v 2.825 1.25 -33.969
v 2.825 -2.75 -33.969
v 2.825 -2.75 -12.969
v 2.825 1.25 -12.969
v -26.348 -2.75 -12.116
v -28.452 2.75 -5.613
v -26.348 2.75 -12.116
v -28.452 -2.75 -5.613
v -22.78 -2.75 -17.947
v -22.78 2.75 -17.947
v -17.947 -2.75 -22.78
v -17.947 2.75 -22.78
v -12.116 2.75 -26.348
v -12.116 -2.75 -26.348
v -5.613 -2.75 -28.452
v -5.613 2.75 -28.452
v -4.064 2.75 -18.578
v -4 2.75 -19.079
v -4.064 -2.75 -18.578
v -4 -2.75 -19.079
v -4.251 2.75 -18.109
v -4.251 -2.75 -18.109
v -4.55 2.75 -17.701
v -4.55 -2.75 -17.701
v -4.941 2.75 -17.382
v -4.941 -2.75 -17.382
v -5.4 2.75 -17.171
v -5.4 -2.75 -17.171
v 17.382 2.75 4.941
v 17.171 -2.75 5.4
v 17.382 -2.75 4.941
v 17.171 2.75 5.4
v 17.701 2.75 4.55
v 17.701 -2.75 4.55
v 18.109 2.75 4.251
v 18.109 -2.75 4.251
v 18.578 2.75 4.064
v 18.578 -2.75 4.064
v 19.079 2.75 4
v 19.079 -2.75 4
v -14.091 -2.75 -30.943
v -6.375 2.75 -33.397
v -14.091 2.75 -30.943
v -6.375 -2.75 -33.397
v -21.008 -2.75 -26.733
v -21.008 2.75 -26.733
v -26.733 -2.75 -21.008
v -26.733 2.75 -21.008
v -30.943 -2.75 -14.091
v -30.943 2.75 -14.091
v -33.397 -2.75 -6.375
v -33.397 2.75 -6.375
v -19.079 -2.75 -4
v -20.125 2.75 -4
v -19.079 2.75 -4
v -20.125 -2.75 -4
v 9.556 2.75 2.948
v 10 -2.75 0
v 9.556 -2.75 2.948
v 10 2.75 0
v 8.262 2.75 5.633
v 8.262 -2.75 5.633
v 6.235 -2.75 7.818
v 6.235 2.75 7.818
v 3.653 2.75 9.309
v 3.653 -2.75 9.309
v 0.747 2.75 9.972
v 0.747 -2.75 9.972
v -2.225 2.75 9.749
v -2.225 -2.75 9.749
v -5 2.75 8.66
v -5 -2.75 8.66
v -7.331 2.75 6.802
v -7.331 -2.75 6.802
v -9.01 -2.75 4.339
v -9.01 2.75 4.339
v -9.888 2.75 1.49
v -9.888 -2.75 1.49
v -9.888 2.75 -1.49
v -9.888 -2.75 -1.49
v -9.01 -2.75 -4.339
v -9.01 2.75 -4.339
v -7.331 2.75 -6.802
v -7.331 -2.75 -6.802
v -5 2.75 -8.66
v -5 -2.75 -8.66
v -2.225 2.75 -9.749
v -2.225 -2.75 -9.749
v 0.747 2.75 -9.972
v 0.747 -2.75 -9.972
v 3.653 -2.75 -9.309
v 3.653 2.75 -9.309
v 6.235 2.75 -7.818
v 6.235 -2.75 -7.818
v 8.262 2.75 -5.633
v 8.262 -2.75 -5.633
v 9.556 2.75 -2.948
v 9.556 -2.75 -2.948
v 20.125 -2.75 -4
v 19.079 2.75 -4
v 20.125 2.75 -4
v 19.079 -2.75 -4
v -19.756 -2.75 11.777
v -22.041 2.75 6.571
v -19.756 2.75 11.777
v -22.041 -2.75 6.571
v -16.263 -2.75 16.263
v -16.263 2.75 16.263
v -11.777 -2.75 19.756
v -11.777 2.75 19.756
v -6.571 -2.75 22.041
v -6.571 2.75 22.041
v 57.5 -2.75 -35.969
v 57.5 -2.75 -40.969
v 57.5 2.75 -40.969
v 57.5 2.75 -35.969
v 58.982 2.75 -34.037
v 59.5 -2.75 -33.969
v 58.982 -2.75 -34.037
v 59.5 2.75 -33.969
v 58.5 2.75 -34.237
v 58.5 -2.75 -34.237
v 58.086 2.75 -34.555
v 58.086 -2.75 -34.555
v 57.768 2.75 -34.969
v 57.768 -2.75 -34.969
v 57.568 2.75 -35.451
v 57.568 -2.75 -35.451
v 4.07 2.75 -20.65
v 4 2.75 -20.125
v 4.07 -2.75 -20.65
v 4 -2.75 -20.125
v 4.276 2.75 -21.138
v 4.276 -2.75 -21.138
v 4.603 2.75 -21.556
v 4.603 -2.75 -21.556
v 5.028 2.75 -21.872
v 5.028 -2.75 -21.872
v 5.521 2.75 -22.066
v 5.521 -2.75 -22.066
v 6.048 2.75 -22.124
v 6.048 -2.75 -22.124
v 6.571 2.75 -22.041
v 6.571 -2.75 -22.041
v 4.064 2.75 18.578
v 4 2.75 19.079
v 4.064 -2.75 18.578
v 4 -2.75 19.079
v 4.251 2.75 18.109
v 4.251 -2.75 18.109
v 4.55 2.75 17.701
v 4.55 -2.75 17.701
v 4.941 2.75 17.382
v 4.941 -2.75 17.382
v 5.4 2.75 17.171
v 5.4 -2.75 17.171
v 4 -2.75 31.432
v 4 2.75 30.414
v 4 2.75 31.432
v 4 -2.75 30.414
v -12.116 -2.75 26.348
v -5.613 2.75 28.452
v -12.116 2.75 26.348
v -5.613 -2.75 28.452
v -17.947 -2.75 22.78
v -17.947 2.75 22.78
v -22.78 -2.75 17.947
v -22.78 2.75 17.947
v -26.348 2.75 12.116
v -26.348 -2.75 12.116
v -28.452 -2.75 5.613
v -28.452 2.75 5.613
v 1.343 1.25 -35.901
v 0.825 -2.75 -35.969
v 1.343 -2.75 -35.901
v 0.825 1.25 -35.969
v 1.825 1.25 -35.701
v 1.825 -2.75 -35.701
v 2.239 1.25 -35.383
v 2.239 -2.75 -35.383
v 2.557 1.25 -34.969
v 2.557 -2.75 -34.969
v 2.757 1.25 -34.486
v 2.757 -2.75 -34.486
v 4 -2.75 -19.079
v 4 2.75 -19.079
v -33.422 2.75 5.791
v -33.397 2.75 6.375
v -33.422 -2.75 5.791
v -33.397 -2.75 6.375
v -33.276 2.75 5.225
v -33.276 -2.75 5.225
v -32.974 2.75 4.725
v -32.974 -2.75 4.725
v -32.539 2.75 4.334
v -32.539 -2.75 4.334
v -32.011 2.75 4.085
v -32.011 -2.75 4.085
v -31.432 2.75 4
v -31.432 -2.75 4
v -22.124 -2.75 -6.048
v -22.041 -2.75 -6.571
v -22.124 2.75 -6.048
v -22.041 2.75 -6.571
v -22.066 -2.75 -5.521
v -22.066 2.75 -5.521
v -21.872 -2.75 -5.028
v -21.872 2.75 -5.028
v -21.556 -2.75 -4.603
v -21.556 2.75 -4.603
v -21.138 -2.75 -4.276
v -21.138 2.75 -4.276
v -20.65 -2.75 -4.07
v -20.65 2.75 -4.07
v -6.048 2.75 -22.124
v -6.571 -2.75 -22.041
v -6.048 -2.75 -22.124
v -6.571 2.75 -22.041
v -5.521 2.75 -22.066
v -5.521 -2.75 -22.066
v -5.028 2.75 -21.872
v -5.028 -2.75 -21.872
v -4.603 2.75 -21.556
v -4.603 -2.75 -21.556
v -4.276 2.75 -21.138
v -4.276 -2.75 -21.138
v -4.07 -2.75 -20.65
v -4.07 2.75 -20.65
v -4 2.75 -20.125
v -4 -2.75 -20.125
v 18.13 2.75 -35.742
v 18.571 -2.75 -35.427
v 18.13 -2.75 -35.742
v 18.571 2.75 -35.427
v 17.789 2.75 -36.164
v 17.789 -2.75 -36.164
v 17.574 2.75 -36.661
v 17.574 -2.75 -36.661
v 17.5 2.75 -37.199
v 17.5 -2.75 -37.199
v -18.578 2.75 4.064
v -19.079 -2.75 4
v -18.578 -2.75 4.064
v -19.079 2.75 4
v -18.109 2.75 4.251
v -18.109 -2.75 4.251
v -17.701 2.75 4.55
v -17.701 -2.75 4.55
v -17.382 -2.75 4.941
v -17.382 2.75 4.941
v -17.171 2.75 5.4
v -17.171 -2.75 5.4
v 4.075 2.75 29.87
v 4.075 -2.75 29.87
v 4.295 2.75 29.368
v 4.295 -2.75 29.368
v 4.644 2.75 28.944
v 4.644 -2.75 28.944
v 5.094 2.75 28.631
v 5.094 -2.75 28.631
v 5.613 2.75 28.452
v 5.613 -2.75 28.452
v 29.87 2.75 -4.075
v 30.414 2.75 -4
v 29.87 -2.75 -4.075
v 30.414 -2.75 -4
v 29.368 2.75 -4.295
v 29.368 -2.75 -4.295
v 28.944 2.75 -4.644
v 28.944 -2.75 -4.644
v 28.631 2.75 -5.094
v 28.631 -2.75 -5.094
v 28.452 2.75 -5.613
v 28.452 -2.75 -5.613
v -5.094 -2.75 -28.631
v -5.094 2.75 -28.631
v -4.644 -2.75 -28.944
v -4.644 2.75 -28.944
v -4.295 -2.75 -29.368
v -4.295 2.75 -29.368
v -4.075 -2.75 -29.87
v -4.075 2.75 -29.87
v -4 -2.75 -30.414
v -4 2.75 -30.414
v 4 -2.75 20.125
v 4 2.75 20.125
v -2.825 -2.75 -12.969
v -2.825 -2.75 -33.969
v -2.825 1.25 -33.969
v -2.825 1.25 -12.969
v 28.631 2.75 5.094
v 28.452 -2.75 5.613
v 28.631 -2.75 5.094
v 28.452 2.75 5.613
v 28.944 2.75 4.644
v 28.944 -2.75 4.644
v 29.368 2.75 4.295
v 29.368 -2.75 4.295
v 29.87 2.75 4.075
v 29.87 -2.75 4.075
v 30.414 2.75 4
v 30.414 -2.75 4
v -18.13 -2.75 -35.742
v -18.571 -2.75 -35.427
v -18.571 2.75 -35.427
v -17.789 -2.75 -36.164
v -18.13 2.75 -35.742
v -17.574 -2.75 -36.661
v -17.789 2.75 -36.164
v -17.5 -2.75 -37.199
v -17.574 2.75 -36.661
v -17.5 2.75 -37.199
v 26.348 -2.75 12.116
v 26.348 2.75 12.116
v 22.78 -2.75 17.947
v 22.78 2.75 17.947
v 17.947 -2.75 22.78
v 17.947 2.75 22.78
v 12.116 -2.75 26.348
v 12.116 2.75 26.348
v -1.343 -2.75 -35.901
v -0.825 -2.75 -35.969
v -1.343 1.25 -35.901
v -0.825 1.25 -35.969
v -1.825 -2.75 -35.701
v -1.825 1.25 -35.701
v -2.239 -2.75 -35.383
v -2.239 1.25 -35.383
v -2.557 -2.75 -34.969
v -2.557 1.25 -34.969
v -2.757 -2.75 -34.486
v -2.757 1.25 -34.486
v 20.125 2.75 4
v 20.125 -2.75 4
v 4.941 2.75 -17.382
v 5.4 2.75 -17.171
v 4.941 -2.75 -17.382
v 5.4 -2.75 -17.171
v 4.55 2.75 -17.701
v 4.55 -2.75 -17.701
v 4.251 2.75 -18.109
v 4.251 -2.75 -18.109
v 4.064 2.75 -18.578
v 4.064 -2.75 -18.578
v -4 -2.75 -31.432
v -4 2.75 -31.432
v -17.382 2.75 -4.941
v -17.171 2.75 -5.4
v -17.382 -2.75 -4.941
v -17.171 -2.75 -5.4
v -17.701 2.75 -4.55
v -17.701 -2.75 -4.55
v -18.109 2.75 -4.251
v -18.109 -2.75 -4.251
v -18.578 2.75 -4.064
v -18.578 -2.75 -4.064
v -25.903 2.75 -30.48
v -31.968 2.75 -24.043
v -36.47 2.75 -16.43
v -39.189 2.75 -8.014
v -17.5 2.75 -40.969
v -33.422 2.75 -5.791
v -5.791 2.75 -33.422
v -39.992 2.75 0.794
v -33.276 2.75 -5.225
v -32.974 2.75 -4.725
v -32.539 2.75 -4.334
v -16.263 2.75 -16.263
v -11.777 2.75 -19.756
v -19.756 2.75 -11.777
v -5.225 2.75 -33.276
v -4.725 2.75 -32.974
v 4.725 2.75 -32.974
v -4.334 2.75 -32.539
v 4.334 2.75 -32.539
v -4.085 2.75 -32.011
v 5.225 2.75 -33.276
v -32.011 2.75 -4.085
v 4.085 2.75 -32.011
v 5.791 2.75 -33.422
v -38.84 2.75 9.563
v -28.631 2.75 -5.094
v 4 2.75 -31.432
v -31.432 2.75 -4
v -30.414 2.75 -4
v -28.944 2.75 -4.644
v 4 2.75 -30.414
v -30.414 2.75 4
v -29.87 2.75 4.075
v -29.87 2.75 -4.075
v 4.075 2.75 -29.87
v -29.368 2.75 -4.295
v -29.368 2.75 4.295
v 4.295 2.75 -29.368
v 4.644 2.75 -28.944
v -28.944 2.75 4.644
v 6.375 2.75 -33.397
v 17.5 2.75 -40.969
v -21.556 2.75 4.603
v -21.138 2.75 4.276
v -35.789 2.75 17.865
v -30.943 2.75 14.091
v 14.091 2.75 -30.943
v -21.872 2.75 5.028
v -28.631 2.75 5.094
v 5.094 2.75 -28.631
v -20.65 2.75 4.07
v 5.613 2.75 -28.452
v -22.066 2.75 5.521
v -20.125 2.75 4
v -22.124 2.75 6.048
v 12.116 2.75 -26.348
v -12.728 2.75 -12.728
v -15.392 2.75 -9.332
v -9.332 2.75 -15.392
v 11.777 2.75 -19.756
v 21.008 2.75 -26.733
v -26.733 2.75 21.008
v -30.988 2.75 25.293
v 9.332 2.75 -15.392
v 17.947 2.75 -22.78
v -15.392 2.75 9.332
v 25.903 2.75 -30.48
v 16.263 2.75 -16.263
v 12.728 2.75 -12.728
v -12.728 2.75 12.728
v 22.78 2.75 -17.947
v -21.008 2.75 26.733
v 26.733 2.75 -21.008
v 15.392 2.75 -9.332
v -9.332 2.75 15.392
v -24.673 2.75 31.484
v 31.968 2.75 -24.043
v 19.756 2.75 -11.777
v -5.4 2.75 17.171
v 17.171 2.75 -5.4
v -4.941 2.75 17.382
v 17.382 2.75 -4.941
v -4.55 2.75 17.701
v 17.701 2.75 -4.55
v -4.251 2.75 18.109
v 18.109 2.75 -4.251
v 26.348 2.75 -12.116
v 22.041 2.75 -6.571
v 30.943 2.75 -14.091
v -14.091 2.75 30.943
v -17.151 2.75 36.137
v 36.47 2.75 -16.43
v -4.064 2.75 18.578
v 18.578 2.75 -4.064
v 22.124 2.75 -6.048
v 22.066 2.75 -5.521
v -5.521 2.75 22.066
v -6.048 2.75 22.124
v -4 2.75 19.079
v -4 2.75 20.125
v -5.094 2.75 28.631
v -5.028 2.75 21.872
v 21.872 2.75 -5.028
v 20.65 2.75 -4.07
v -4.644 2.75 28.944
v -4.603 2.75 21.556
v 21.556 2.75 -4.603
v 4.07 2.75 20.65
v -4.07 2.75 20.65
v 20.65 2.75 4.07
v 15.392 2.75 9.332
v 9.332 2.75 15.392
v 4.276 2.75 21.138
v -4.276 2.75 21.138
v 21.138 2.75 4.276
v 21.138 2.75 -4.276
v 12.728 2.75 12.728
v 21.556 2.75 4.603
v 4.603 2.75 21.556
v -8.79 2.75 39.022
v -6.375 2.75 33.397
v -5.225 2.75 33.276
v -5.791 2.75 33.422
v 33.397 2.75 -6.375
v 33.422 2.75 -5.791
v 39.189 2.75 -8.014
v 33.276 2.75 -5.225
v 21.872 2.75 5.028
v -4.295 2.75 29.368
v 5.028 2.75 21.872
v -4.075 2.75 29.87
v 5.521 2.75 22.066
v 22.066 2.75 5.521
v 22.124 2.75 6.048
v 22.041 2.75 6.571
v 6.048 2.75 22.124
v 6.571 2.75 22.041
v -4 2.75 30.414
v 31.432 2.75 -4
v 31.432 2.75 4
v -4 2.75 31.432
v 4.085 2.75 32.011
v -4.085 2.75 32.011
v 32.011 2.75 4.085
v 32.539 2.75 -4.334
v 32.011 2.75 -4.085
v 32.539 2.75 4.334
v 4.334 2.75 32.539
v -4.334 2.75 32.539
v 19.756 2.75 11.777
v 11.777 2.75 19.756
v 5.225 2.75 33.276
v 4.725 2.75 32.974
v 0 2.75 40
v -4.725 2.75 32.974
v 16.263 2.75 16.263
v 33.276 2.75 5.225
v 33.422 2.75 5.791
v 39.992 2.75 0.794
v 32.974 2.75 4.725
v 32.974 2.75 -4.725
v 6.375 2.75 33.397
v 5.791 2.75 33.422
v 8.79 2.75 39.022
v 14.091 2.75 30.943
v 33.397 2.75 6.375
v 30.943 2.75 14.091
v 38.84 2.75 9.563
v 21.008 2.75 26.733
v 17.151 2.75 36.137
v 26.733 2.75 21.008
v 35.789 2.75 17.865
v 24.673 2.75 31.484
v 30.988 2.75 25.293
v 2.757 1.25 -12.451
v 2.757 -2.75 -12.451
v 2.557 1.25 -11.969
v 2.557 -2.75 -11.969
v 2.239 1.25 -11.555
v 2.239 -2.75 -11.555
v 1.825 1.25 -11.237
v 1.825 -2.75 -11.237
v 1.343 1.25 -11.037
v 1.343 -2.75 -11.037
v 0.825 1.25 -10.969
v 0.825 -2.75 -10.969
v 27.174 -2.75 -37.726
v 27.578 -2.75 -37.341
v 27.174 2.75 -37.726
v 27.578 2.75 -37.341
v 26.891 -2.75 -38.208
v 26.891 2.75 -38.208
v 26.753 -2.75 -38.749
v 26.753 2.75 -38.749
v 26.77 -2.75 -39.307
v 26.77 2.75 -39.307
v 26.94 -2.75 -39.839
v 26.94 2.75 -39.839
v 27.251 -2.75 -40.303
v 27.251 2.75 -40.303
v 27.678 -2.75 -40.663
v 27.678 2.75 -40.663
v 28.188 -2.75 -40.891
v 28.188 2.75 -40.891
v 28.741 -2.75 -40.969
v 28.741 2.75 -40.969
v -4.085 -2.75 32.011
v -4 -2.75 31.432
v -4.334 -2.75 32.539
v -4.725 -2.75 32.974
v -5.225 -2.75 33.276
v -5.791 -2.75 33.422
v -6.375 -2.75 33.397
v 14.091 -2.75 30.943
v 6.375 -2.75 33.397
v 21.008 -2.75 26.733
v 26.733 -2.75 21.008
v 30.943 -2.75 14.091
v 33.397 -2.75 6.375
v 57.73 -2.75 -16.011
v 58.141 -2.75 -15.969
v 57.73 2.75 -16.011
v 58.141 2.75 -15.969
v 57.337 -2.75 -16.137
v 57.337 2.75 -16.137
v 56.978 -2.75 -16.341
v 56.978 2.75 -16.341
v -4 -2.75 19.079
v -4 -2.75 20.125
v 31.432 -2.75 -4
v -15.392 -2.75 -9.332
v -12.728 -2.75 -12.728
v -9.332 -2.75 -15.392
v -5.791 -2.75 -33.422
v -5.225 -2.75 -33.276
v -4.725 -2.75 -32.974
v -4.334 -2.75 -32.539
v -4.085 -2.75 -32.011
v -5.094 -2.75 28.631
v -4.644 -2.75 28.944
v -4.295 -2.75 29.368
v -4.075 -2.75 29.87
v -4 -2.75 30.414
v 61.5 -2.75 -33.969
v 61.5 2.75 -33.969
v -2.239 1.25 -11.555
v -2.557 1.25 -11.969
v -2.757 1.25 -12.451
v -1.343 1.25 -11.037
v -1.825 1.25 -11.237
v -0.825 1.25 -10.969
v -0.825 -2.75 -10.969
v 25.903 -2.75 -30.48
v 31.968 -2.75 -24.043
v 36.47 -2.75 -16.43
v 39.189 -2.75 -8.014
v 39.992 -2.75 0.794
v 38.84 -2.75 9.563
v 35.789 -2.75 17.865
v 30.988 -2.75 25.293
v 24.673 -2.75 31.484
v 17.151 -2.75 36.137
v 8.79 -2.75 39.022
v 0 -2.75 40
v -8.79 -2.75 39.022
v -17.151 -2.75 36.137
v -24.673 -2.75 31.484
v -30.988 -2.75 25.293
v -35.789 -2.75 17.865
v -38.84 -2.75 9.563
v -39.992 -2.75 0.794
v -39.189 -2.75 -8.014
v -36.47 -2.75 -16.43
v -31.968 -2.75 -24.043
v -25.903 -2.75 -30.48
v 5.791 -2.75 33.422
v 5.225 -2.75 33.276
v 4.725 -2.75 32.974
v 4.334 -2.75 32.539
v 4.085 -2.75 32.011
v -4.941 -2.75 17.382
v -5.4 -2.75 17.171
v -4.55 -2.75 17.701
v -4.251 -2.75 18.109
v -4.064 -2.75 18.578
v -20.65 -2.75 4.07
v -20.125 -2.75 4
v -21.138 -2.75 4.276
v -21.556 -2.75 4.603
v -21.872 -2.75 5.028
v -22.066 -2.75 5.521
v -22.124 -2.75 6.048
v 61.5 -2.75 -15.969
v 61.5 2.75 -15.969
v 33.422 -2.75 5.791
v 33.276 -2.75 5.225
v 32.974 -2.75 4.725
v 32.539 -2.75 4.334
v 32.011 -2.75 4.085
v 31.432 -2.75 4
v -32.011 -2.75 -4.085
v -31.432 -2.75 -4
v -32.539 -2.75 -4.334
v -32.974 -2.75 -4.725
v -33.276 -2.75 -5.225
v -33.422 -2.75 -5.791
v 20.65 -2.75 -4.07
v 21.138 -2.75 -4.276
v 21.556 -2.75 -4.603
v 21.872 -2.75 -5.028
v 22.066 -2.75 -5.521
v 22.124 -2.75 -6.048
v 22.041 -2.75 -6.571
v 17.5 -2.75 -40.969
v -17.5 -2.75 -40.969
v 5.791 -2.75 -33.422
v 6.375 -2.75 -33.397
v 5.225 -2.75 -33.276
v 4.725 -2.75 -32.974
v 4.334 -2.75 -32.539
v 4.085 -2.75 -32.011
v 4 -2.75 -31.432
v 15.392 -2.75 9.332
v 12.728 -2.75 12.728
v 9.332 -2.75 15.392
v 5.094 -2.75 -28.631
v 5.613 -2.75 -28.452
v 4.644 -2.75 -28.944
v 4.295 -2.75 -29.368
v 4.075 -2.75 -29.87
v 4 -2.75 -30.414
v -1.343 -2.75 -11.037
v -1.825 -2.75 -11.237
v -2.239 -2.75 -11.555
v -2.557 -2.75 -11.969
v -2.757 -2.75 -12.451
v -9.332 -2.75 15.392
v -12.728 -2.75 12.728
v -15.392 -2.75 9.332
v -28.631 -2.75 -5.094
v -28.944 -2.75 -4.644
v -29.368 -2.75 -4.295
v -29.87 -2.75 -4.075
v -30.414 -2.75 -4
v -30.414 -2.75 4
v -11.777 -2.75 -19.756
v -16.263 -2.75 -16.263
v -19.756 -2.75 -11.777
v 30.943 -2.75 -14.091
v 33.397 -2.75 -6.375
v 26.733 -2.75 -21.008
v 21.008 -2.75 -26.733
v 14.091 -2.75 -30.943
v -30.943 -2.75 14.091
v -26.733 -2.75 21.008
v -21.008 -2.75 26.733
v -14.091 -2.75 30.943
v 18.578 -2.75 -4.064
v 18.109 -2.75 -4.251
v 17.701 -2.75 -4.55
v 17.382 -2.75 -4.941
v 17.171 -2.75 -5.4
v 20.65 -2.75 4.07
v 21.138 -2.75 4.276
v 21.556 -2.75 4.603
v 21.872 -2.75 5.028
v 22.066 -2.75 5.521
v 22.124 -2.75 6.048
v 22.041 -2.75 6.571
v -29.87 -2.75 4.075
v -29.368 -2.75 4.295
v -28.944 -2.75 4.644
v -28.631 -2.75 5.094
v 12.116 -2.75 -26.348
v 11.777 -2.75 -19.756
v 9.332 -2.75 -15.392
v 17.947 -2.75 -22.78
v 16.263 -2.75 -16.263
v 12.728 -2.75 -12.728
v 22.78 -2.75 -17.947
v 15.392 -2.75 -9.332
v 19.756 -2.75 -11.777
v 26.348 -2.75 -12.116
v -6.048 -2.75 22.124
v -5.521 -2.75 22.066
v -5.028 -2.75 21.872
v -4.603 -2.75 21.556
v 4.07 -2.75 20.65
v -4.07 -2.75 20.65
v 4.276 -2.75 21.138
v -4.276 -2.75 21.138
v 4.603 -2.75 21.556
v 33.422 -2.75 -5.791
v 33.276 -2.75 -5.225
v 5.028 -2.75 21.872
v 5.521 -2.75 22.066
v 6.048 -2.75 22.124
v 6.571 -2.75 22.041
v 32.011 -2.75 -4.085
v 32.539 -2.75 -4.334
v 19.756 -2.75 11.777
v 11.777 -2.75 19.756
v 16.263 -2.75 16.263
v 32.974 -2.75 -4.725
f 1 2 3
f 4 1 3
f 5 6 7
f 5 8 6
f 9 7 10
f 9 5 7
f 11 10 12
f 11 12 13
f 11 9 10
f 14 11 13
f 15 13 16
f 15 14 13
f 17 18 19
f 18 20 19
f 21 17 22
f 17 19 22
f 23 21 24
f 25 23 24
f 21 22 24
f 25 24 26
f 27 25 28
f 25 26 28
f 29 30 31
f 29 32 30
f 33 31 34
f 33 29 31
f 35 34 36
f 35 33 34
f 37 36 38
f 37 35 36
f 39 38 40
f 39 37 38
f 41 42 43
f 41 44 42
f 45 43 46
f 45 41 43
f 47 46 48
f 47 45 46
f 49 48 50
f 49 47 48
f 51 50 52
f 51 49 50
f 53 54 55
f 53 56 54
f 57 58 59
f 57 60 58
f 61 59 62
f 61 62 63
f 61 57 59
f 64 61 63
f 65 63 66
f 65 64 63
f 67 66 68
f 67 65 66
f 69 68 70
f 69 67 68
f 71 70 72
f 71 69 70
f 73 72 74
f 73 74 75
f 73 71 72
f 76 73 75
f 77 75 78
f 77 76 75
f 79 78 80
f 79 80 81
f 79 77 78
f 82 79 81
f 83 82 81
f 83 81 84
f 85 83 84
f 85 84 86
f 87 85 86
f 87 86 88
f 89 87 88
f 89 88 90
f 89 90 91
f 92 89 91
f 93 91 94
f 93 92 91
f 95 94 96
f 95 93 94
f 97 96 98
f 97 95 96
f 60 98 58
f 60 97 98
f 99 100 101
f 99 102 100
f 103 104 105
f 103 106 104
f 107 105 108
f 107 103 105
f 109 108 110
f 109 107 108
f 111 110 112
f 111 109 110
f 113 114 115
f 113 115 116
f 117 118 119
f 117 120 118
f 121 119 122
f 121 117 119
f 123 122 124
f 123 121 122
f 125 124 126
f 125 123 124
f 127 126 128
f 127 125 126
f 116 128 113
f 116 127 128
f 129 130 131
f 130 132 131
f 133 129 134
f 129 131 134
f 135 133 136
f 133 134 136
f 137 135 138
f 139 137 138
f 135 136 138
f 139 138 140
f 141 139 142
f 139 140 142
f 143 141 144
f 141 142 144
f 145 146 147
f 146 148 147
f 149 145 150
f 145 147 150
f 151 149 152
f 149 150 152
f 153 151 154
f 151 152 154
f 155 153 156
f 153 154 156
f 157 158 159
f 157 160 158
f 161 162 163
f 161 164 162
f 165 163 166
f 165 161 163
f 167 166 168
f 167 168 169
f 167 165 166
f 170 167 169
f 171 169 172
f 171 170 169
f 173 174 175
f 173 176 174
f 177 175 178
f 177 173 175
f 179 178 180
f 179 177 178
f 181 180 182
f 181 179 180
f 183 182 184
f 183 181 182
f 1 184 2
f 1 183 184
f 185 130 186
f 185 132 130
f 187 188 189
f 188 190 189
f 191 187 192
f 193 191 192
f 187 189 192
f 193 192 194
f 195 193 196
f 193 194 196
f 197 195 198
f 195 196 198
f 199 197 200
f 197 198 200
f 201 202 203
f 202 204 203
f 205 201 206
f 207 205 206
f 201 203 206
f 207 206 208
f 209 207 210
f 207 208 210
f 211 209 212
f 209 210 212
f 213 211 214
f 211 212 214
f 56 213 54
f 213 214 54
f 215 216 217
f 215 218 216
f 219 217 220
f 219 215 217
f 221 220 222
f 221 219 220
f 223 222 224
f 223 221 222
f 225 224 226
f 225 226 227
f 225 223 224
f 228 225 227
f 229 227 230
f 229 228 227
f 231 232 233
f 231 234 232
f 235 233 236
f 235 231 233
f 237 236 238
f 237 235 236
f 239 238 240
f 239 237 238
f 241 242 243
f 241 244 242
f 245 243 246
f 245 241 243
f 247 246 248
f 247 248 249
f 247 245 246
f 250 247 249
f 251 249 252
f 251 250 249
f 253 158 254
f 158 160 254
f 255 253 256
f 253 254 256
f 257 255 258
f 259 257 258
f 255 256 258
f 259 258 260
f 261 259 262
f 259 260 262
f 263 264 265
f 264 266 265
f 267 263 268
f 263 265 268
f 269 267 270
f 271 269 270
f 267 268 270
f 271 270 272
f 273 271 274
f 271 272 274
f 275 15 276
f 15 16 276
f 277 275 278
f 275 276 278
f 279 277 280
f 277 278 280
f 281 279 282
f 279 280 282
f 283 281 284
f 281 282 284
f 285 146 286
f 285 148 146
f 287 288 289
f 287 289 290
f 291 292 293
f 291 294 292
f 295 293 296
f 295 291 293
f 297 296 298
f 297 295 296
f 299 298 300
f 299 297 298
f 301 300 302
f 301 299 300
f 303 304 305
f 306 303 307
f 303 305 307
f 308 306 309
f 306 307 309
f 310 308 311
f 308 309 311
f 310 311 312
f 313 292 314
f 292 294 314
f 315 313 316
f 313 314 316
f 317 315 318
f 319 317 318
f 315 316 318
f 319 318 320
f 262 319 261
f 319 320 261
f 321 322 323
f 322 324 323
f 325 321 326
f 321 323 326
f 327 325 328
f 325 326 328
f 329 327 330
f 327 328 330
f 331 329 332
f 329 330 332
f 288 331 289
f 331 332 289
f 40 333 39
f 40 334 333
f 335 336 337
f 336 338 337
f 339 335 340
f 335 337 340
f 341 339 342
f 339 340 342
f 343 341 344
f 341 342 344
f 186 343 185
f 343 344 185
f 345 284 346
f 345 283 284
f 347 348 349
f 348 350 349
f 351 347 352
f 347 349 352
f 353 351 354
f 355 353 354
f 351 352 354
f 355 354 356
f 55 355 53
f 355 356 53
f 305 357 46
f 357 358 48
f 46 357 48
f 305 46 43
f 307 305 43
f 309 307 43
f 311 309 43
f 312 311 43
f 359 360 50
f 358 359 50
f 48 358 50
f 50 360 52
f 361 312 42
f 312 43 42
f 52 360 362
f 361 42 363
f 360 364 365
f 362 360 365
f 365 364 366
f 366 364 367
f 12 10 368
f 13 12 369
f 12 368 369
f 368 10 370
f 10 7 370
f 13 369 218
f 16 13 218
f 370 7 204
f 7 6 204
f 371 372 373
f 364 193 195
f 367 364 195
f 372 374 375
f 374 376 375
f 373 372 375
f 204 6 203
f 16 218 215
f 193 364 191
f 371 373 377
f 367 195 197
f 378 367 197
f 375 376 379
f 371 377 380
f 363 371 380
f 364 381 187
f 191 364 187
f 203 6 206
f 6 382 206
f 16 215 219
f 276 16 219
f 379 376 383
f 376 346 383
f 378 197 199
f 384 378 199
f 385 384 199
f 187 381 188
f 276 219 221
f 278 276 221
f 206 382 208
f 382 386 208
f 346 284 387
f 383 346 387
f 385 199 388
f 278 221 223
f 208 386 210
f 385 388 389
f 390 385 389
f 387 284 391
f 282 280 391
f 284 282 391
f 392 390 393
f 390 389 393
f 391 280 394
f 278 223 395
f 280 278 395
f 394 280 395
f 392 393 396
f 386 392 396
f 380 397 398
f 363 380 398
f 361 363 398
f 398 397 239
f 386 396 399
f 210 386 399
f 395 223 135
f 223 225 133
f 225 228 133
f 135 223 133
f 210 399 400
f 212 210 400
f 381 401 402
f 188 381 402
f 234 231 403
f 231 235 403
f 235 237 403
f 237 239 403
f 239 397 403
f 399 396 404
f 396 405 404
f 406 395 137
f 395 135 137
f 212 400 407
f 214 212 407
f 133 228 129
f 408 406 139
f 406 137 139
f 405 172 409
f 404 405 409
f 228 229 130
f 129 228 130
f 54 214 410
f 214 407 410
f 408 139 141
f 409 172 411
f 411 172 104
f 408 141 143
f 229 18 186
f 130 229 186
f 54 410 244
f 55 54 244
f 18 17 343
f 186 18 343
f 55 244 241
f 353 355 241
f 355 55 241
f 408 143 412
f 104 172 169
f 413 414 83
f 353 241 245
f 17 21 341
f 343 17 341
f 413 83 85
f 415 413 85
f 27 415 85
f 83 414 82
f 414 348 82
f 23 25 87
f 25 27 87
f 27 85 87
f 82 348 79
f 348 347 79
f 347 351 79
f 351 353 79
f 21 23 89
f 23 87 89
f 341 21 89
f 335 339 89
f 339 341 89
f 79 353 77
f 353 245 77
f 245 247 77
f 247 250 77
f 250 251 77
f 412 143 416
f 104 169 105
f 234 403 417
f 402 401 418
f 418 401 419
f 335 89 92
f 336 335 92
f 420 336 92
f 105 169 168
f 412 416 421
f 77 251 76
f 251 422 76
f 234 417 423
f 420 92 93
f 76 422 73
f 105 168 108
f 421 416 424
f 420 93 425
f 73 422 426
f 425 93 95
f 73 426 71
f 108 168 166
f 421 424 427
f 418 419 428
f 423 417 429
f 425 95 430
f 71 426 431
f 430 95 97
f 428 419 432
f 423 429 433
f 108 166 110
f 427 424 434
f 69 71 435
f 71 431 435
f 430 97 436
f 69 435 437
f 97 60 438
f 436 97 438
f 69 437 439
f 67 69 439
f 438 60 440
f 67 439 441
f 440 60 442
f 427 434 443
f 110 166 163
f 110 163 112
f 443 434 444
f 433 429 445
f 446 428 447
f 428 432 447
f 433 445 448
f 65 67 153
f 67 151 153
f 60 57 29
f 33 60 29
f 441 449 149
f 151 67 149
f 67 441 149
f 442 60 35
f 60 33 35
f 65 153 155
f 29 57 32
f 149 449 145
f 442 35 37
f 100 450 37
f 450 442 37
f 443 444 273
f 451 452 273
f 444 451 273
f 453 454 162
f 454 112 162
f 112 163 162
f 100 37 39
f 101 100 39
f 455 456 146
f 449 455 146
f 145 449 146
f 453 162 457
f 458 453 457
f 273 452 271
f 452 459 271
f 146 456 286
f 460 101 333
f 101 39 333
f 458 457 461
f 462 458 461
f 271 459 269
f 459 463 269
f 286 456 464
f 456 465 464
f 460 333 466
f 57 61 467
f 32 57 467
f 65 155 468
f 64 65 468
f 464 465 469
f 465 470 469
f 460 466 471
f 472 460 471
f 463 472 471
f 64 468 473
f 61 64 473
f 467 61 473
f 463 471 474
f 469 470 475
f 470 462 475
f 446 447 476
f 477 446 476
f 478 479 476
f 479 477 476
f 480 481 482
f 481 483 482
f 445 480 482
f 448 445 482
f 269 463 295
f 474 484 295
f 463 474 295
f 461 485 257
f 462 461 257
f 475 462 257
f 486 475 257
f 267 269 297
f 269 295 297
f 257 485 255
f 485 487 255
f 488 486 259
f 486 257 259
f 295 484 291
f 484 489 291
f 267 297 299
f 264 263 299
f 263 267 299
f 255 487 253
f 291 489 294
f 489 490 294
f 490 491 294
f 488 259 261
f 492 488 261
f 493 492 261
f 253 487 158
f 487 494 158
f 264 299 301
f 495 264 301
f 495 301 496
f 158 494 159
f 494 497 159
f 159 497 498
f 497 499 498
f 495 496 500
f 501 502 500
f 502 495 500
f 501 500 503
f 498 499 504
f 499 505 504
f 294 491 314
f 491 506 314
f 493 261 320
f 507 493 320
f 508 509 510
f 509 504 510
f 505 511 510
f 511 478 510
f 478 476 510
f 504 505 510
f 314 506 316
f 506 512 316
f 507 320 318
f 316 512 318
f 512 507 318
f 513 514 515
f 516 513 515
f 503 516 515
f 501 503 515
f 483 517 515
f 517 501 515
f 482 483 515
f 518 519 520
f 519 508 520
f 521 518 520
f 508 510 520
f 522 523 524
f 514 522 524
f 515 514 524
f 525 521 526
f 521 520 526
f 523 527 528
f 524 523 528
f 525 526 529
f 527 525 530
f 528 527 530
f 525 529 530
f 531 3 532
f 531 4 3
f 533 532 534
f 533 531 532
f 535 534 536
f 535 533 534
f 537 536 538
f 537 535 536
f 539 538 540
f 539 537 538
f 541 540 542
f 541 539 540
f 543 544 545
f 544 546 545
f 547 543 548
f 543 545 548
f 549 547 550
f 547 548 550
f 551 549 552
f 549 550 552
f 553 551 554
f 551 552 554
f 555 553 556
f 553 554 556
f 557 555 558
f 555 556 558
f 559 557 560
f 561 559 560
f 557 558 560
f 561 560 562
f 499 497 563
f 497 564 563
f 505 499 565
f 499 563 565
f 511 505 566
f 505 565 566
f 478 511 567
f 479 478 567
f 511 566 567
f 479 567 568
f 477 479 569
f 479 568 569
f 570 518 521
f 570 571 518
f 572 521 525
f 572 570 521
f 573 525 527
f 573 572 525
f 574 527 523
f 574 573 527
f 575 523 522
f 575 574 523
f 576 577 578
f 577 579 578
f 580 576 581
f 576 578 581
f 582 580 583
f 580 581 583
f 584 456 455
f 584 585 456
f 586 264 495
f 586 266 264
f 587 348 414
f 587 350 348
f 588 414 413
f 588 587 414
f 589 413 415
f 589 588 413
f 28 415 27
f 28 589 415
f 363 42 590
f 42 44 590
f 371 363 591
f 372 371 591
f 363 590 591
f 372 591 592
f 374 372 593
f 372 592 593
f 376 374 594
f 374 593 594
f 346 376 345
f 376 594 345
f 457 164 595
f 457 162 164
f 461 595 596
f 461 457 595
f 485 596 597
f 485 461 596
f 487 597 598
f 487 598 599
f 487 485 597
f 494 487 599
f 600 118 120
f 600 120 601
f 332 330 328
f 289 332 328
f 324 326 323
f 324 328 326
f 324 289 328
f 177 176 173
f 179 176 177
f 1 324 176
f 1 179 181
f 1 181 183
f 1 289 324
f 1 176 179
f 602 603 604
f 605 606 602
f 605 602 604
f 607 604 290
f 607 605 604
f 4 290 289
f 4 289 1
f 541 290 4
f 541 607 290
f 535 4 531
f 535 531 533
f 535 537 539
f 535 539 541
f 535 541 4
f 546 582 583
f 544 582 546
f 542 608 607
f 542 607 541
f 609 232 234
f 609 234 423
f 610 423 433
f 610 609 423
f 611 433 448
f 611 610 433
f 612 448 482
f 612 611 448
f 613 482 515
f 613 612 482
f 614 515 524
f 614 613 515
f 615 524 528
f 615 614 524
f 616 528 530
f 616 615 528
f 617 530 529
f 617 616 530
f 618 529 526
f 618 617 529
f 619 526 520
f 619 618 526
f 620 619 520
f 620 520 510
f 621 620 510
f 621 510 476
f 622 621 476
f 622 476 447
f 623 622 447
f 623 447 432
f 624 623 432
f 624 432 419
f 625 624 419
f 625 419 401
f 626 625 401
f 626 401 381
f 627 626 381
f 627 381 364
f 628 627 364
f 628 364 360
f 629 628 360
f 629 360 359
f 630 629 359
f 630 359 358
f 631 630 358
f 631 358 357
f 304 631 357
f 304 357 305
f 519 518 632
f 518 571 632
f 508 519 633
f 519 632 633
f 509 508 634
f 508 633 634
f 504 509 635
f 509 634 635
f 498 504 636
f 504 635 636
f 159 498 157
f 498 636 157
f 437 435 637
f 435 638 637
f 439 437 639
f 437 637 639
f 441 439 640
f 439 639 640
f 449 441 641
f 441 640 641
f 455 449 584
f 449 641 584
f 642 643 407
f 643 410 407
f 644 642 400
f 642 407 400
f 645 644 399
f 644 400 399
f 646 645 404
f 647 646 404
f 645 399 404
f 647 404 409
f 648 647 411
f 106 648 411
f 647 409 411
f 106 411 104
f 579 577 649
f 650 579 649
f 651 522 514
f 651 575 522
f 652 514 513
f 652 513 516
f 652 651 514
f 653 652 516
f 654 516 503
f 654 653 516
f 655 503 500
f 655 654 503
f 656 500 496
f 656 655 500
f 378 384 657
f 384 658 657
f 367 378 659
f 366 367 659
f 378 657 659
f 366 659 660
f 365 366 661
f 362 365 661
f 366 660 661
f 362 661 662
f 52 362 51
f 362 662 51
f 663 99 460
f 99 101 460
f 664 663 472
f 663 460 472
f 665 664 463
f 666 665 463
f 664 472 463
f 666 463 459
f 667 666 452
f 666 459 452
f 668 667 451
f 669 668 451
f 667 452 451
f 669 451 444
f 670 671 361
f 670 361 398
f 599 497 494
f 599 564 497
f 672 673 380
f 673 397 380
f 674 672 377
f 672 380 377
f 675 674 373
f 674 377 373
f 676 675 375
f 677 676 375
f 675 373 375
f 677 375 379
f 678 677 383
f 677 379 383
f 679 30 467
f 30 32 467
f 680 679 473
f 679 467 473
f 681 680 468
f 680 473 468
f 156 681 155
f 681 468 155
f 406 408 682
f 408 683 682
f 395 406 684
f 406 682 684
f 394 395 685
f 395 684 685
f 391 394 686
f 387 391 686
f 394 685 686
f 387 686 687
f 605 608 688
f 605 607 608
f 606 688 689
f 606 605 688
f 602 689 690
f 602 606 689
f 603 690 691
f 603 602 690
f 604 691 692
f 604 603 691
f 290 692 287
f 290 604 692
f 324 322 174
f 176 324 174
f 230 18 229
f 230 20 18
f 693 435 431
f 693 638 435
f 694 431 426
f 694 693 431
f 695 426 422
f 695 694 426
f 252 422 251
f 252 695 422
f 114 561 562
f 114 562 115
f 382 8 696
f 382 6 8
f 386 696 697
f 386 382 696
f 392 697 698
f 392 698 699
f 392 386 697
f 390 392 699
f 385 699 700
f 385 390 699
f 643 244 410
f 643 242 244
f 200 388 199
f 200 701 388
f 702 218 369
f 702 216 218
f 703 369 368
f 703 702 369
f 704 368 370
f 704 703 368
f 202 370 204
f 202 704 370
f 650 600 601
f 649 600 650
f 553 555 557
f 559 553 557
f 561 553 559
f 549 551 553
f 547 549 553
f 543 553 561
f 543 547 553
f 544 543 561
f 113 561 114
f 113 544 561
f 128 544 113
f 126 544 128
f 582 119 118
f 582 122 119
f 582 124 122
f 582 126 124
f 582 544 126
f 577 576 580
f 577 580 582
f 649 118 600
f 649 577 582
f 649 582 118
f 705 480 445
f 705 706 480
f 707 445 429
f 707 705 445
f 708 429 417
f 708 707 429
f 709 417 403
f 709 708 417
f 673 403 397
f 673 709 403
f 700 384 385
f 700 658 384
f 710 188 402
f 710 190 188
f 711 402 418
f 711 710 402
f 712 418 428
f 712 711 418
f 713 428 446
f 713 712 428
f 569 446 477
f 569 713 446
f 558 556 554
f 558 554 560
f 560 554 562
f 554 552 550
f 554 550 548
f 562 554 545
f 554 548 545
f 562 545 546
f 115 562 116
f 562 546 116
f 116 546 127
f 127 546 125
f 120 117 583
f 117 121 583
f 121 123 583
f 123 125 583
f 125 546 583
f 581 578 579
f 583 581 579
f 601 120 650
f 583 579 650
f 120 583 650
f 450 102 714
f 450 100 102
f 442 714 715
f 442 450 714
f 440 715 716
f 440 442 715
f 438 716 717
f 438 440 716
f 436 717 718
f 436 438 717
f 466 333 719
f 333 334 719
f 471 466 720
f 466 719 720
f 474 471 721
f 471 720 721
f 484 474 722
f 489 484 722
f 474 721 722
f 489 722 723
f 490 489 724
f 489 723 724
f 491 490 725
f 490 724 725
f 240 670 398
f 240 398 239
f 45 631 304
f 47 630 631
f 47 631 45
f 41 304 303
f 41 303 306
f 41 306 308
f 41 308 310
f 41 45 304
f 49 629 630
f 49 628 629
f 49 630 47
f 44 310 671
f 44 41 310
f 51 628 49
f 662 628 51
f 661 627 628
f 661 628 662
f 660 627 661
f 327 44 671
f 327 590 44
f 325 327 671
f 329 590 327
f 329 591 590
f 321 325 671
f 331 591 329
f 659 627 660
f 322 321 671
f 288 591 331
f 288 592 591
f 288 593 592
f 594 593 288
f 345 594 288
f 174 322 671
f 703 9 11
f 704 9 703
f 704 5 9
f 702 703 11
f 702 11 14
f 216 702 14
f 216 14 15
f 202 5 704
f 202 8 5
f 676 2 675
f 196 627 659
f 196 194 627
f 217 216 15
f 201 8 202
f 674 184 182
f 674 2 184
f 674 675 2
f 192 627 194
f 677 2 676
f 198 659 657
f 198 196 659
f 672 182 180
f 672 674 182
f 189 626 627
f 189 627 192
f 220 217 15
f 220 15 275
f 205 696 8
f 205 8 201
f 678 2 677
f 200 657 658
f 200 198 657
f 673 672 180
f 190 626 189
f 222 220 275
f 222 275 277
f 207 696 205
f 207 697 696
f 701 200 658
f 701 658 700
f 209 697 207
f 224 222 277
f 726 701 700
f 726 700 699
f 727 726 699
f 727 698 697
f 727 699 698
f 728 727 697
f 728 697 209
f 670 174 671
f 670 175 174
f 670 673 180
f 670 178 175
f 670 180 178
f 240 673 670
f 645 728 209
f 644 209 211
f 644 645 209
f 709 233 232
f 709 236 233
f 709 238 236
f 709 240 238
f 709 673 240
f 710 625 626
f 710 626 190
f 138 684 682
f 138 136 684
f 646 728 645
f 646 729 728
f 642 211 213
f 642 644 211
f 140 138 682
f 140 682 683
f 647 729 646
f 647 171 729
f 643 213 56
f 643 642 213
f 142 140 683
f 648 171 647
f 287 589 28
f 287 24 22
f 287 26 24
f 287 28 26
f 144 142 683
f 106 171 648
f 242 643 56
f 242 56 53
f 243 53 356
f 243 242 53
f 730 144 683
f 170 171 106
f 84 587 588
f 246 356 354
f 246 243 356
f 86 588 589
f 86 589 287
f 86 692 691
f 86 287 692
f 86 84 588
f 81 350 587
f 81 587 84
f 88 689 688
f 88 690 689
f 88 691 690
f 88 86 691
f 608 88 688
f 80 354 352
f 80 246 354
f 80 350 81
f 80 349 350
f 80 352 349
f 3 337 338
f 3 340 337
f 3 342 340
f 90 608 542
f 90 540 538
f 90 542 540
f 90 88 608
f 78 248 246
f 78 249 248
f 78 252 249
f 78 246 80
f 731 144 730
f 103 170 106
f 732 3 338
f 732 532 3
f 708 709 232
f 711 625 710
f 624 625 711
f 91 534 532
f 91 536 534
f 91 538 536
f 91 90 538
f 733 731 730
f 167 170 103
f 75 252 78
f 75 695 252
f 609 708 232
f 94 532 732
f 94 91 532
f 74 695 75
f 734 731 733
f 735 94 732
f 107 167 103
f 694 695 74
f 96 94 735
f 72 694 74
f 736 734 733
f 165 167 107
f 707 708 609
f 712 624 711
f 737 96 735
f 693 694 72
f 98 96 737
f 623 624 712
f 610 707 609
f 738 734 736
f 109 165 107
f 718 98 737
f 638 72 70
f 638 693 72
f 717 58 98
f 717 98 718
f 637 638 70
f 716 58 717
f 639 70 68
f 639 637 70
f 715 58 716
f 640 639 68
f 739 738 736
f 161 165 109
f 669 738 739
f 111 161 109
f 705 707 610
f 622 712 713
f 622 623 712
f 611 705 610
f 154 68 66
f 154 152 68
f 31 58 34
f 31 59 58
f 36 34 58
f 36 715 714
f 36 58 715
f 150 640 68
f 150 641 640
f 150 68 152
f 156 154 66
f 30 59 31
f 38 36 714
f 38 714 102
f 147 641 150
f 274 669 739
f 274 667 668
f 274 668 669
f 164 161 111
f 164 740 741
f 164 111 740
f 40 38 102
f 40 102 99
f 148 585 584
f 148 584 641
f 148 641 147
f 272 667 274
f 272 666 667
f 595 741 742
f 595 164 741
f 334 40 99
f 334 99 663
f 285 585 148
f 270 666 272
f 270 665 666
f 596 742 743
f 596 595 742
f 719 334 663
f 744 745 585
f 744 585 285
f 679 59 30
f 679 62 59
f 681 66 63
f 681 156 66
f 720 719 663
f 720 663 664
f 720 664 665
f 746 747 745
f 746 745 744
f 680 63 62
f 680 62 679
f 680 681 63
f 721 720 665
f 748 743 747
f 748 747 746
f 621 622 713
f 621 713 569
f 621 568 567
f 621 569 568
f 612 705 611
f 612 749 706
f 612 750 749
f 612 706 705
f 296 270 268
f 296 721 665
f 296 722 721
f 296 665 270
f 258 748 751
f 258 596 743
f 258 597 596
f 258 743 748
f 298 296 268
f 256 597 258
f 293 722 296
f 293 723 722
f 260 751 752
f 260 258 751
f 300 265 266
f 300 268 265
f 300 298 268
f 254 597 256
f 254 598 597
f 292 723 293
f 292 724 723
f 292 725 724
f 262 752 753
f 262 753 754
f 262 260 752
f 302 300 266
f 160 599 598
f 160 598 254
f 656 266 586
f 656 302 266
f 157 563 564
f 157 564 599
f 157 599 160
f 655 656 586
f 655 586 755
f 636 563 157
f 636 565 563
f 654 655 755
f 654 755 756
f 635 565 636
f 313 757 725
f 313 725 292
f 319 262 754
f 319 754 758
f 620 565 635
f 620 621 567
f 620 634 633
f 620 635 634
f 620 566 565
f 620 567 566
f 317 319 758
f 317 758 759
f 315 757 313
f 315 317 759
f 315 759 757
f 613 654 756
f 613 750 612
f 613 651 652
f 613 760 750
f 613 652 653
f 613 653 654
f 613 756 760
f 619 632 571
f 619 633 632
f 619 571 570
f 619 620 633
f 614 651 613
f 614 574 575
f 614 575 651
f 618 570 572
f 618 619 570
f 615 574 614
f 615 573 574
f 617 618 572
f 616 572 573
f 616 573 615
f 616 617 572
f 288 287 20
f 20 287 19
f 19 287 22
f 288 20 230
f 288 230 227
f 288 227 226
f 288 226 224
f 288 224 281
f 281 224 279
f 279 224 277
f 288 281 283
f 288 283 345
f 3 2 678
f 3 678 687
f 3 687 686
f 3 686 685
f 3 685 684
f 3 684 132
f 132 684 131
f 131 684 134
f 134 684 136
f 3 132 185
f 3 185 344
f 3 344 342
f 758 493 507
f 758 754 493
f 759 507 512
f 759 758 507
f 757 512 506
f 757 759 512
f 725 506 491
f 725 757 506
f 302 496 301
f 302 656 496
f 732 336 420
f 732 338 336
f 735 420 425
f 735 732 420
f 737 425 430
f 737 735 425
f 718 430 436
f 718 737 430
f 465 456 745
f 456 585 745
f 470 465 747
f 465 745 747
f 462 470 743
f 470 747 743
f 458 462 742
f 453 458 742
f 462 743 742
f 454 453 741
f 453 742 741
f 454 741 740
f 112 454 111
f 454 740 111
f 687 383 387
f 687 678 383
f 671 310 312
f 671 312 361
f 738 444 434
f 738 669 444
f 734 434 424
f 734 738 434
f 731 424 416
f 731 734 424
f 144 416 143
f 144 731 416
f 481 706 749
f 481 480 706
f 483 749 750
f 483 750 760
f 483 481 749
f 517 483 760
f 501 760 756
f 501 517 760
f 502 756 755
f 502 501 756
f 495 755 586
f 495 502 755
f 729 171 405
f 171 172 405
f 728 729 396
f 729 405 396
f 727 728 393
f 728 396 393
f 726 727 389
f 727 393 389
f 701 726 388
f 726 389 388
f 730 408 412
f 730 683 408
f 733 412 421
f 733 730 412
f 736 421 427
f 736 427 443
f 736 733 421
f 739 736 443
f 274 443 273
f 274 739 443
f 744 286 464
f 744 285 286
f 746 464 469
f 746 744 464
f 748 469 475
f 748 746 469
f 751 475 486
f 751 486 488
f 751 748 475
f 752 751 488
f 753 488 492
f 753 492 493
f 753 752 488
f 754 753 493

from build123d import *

# Parameters (mm, degrees)
F0_R      = 40
F0_R_2    = 10
F1_DEPTH  = 2.75
F3_DEPTH  = 5.5
F5_DEPTH  = 5.5
F6_R      = 2
F6_2_R    = 2
F7_W      = 4
F7_H      = 18
F8_DEPTH  = 5.5
F9_R      = 2
F10_W     = 5.65
F10_H     = 25
F11_DEPTH = 4
F12_R     = 2


with BuildPart() as f1:
    # F0 (on Front) → F1 (new body, symmetric)
    with BuildSketch(Plane.XZ):
        Circle(F0_R)
        with BuildLine():
            ThreePointArc((-4, -33.7638860323), (-24.0416305603, -24.0416305603), (-33.7638860323, -4))
            Line((-33.7638860323, -4), (-28.7228132327, -4))
            ThreePointArc((-28.7228132327, -4), (-20.5060966544, -20.5060966544), (-4, -28.7228132327))
            Line((-4, -28.7228132327), (-4, -33.7638860323))
        make_face(mode=Mode.SUBTRACT)
        with BuildLine():
            ThreePointArc((-17.5499287748, -4), (-12.7279220614, -12.7279220614), (-4, -17.5499287748))
            Line((-4, -17.5499287748), (-4, -22.6495033058))
            ThreePointArc((-4, -22.6495033058), (-16.2634559673, -16.2634559673), (-22.6495033058, -4))
            Line((-22.6495033058, -4), (-17.5499287748, -4))
        make_face(mode=Mode.SUBTRACT)
        with BuildLine():
            ThreePointArc((4, -28.7228132327), (20.5060966544, -20.5060966544), (28.7228132327, -4))
            Line((28.7228132327, -4), (33.7638860323, -4))
            ThreePointArc((33.7638860323, -4), (24.0416305603, -24.0416305603), (4, -33.7638860323))
            Line((4, -33.7638860323), (4, -28.7228132327))
        make_face(mode=Mode.SUBTRACT)
        with BuildLine():
            Line((4, -22.6495033058), (4, -17.5499287748))
            ThreePointArc((4, -17.5499287748), (12.7279220614, -12.7279220614), (17.5499287748, -4))
            Line((17.5499287748, -4), (22.6495033058, -4))
            ThreePointArc((22.6495033058, -4), (16.2634559673, -16.2634559673), (4, -22.6495033058))
        make_face(mode=Mode.SUBTRACT)
        with BuildLine():
            Line((-4, 22.6495033058), (-4, 17.5499287748))
            ThreePointArc((-4, 17.5499287748), (-12.7279220614, 12.7279220614), (-17.5499287748, 4))
            Line((-17.5499287748, 4), (-22.6495033058, 4))
            ThreePointArc((-22.6495033058, 4), (-16.2634559673, 16.2634559673), (-4, 22.6495033058))
        make_face(mode=Mode.SUBTRACT)
        with BuildLine():
            ThreePointArc((-33.7638860323, 4), (-24.0416305603, 24.0416305603), (-4, 33.7638860323))
            Line((-4, 33.7638860323), (-4, 28.7228132327))
            ThreePointArc((-4, 28.7228132327), (-20.5060966544, 20.5060966544), (-28.7228132327, 4))
            Line((-28.7228132327, 4), (-33.7638860323, 4))
        make_face(mode=Mode.SUBTRACT)
        Circle(F0_R_2, mode=Mode.SUBTRACT)
        with BuildLine():
            Line((22.6495033058, 4), (17.5499287748, 4))
            ThreePointArc((17.5499287748, 4), (12.7279220614, 12.7279220614), (4, 17.5499287748))
            Line((4, 17.5499287748), (4, 22.6495033058))
            ThreePointArc((4, 22.6495033058), (16.2634559673, 16.2634559673), (22.6495033058, 4))
        make_face(mode=Mode.SUBTRACT)
        with BuildLine():
            ThreePointArc((28.7228132327, 4), (20.5060966544, 20.5060966544), (4, 28.7228132327))
            Line((4, 28.7228132327), (4, 33.7638860323))
            ThreePointArc((4, 33.7638860323), (24.0416305603, 24.0416305603), (33.7638860323, 4))
            Line((33.7638860323, 4), (28.7228132327, 4))
        make_face(mode=Mode.SUBTRACT)
    extrude(amount=F1_DEPTH, both=True)

    # F2 (on face) → F3 (join)
    with BuildSketch(Plane.XZ.offset(2.75)):
        with BuildLine():
            ThreePointArc((17.5, -35.9687364248), (0, -40), (-17.5, -35.9687364248))
            Line((-17.5, -35.9687364248), (-17.5, -40.9687364248))
            Line((-17.5, -40.9687364248), (17.5, -40.9687364248))
            Line((17.5, -40.9687364248), (17.5, -35.9687364248))
        make_face()
    extrude(amount=-F3_DEPTH)

    # F6
    f6_edges = [f1.edges().sort_by_distance(p)[0] for p in [
        (17.549929, 0, 4),
        (28.722813, 0, 4),
        (4, 0, 28.722813),
        (-22.649503, 0, 4),
        (-4, 0, 28.722813),
        (-28.722813, 0, 4),
        (-17.549929, 0, 4),
        (-4, 0, 17.549929),
        (4, 0, 33.763886),
        (33.763886, 0, 4),
        (-4, 0, 33.763886),
        (-33.763886, 0, 4),
        (-17.549929, 0, -4),
        (-28.722813, 0, -4),
        (28.722813, 0, -4),
        (4, 0, -28.722813),
        (33.763886, 0, -4),
        (22.649503, 0, -4),
        (-4, 0, -28.722813),
        (-33.763886, 0, -4),
        (-22.649503, 0, -4),
        (-4, 0, -33.763886),
        (4, 0, -33.763886),
        (22.649503, 0, 4),
        (-4, 0, 22.649503),
        (-4, 0, -17.549929),
        (4, 0, -22.649503),
        (-4, 0, -22.649503),
        (-17.5, 0, -35.968736),
        (17.5, 0, -35.968736),
        (4, 0, 22.649503),
        (4, 0, 17.549929),
        (17.549929, 0, -4),
        (4, 0, -17.549929),
    ]]
    fillet(f6_edges, radius=F6_R)

    # F10 (on face) → F11 (cut)
    with BuildSketch(Plane.XZ.offset(2.75)):
        with Locations((0, -23.4687364248)):
            Rectangle(F10_W, F10_H)
    extrude(amount=-F11_DEPTH, mode=Mode.SUBTRACT)

    # F12
    f12_edges = [f1.edges().sort_by_distance(p)[0] for p in [
        (-2.825, -0.75, -10.968736),
        (2.825, -0.75, -10.968736),
        (2.825, -0.75, -35.968736),
        (-2.825, -0.75, -35.968736),
    ]]
    fillet(f12_edges, radius=F12_R)


with BuildPart() as f5:
    # F4 (on face) → F5 (new body)
    with BuildSketch(Plane.XZ.offset(2.75)):
        Polygon((57.5, -15.9687364248), (22.5, -40.9687364248), (57.5, -40.9687364248), align=None)
    extrude(amount=-F5_DEPTH)

    # F6#2
    f6_2_edges = [f5.edges().sort_by_distance(p)[0] for p in [
        (22.5, 0, -40.968736),
    ]]
    fillet(f6_2_edges, radius=F6_2_R)

    # F7 (on face) → F8 (join)
    with BuildSketch(Plane.XZ.offset(2.75)):
        with Locations((59.5, -24.9687364248)):
            Rectangle(F7_W, F7_H)
    extrude(amount=-F8_DEPTH)

    # F9
    f9_edges = [f5.edges().sort_by_distance(p)[0] for p in [
        (57.5, 0, -33.968736),
        (57.5, 0, -15.968736),
    ]]
    fillet(f9_edges, radius=F9_R)


solid = Compound([f1.part, f5.part])
